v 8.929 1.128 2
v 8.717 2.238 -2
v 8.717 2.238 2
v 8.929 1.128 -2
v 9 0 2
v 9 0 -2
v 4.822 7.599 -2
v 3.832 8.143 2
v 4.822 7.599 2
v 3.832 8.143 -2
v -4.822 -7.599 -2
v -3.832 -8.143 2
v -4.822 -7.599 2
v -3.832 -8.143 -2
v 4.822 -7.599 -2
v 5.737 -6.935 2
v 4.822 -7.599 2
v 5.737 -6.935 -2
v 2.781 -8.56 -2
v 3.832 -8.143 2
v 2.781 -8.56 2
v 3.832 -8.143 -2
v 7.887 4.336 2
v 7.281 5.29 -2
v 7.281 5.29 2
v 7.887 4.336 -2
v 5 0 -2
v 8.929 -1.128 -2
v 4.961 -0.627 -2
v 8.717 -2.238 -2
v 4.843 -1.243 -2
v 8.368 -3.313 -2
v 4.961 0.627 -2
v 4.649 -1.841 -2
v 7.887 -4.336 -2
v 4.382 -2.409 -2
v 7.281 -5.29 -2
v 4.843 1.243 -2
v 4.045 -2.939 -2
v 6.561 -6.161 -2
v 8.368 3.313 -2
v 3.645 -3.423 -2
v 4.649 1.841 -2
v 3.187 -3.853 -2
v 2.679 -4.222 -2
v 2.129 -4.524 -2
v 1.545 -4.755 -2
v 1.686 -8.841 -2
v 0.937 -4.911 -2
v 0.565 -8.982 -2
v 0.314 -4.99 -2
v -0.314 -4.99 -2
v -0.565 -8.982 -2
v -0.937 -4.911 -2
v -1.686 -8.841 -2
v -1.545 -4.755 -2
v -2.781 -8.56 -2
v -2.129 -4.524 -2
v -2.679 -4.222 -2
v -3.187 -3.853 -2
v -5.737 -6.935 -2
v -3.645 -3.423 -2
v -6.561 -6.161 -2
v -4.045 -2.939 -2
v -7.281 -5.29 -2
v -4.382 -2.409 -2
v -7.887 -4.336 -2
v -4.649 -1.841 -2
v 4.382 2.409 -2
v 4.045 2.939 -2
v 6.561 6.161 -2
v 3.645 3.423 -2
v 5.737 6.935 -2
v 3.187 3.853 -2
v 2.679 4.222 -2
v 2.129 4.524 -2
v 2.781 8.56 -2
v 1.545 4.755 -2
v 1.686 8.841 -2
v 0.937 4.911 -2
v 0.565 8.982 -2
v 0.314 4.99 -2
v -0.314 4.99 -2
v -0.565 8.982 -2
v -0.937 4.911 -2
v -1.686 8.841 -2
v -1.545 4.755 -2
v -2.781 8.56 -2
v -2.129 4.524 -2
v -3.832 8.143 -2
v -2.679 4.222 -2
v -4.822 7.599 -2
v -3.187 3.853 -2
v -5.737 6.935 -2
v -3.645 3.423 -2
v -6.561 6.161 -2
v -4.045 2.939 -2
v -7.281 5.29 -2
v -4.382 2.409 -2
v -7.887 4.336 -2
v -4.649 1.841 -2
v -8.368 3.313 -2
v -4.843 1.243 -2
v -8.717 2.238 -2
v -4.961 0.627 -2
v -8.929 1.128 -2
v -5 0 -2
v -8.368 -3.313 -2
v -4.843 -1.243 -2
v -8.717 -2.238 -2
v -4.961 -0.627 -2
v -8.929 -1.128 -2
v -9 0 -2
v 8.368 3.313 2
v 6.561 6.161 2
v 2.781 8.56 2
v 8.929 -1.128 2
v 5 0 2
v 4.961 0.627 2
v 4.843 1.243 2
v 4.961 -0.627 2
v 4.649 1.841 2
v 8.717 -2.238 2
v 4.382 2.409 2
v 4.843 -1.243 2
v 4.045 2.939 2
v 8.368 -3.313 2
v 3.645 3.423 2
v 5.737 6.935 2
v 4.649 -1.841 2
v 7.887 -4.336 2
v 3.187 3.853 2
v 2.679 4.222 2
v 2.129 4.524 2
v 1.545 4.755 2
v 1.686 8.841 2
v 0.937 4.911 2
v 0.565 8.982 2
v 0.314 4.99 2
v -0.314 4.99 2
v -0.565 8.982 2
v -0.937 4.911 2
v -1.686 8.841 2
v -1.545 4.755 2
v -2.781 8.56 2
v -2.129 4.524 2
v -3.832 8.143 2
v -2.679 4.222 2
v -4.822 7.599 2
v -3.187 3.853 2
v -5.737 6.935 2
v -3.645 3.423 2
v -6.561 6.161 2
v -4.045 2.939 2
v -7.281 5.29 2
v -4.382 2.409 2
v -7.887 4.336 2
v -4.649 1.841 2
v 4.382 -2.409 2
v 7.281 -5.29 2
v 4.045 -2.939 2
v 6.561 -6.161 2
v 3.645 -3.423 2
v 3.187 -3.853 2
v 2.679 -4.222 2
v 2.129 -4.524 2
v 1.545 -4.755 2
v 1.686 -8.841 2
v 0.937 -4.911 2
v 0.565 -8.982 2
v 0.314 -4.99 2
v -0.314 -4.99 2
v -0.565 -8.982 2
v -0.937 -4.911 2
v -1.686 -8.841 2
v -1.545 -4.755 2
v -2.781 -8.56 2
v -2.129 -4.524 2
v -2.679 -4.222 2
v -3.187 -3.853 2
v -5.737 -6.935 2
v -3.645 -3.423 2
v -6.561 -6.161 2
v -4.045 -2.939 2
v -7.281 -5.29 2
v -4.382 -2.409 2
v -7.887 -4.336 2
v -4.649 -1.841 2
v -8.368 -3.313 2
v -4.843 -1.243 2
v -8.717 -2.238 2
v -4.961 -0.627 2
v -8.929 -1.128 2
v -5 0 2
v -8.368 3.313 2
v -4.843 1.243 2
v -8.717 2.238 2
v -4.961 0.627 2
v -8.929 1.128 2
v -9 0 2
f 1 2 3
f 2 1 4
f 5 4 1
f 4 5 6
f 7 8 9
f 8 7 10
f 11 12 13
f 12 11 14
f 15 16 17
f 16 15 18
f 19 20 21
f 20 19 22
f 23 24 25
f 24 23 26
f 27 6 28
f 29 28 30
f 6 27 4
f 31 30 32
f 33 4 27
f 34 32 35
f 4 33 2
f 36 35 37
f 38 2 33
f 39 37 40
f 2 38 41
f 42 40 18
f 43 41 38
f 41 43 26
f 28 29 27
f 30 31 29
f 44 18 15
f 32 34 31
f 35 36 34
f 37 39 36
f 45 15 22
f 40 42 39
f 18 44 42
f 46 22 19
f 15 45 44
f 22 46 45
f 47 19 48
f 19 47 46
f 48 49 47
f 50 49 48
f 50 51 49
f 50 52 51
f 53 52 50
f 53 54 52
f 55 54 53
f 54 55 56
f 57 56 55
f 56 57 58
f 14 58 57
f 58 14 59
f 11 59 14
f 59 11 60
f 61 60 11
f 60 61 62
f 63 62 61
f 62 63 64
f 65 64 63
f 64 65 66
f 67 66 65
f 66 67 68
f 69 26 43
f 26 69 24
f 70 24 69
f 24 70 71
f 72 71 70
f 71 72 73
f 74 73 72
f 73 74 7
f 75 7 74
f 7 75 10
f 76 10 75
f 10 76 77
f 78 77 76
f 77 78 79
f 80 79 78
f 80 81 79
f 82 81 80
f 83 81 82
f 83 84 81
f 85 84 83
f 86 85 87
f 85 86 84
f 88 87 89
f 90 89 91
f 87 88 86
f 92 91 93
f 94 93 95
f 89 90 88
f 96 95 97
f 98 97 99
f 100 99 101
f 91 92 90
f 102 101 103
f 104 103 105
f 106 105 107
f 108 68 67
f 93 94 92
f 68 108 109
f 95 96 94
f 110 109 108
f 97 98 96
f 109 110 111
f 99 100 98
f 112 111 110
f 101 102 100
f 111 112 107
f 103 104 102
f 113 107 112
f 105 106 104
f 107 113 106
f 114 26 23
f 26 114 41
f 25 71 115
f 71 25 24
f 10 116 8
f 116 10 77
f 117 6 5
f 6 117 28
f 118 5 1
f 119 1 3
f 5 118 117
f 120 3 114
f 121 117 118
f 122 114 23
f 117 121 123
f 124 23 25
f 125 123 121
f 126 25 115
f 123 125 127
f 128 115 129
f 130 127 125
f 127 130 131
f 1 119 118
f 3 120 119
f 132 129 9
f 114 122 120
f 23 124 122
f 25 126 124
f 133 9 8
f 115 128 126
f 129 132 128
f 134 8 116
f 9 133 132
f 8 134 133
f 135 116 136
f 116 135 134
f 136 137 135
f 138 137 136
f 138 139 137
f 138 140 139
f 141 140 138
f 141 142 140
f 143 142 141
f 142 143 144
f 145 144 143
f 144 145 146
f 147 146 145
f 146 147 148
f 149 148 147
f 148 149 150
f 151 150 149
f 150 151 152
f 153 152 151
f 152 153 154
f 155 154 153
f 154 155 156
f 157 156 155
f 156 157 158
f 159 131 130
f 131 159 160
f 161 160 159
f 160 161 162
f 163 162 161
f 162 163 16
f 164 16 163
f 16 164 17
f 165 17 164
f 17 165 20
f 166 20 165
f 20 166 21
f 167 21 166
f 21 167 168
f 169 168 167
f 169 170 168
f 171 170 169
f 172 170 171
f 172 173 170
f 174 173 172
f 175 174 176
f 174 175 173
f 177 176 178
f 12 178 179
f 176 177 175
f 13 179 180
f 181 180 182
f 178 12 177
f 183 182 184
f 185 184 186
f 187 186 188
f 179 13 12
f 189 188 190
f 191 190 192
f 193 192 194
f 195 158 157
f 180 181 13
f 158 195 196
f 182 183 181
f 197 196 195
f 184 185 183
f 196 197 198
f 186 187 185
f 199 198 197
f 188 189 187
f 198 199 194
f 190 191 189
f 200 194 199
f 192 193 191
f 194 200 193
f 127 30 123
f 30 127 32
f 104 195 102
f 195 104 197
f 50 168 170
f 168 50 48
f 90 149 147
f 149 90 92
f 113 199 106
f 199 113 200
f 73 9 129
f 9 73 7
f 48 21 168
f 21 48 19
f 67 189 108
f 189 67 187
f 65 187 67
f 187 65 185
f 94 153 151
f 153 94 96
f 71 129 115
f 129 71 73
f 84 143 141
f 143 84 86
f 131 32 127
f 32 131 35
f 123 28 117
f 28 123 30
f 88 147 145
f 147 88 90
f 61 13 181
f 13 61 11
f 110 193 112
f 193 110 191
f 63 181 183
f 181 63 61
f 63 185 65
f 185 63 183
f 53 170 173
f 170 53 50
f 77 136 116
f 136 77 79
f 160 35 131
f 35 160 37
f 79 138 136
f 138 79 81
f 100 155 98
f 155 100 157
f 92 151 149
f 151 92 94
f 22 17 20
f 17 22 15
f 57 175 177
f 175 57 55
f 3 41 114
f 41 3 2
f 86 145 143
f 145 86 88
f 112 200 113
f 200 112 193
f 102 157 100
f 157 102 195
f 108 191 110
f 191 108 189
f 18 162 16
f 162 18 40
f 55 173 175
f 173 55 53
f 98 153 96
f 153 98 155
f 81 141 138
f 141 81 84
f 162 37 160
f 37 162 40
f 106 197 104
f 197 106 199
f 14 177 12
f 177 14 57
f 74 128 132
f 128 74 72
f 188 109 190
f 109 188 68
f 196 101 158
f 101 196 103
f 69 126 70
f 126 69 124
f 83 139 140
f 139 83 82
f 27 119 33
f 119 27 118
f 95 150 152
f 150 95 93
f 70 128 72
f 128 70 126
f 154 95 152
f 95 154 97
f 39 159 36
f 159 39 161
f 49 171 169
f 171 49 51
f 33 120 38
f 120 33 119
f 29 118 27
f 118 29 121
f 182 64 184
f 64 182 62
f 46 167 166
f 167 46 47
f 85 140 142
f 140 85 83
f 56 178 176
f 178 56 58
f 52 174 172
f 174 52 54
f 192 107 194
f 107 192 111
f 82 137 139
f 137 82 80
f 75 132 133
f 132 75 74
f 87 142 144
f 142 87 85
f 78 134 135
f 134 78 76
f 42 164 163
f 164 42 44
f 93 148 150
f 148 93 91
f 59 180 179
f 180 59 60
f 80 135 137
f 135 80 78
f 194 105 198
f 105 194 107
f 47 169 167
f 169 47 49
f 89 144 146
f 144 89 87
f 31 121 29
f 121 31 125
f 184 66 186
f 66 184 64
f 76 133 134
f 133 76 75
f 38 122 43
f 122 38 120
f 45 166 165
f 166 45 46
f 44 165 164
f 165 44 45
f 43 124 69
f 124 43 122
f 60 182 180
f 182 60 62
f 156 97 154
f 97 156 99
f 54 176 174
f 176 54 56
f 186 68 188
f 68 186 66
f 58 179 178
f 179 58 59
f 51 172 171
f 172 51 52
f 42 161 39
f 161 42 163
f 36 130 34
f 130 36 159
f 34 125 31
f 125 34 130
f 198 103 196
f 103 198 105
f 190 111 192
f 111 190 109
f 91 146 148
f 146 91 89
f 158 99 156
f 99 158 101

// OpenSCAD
$fn = 50;


difference() {
	union() {
		translate(v = [0, 0, -2.0000000000]) {
			cylinder(h = 4, r = 9.0000000000);
		}
	}
	union() {
		translate(v = [0, 0, -100.0000000000]) {
			cylinder(h = 200, r = 5.0000000000);
		}
	}
}
